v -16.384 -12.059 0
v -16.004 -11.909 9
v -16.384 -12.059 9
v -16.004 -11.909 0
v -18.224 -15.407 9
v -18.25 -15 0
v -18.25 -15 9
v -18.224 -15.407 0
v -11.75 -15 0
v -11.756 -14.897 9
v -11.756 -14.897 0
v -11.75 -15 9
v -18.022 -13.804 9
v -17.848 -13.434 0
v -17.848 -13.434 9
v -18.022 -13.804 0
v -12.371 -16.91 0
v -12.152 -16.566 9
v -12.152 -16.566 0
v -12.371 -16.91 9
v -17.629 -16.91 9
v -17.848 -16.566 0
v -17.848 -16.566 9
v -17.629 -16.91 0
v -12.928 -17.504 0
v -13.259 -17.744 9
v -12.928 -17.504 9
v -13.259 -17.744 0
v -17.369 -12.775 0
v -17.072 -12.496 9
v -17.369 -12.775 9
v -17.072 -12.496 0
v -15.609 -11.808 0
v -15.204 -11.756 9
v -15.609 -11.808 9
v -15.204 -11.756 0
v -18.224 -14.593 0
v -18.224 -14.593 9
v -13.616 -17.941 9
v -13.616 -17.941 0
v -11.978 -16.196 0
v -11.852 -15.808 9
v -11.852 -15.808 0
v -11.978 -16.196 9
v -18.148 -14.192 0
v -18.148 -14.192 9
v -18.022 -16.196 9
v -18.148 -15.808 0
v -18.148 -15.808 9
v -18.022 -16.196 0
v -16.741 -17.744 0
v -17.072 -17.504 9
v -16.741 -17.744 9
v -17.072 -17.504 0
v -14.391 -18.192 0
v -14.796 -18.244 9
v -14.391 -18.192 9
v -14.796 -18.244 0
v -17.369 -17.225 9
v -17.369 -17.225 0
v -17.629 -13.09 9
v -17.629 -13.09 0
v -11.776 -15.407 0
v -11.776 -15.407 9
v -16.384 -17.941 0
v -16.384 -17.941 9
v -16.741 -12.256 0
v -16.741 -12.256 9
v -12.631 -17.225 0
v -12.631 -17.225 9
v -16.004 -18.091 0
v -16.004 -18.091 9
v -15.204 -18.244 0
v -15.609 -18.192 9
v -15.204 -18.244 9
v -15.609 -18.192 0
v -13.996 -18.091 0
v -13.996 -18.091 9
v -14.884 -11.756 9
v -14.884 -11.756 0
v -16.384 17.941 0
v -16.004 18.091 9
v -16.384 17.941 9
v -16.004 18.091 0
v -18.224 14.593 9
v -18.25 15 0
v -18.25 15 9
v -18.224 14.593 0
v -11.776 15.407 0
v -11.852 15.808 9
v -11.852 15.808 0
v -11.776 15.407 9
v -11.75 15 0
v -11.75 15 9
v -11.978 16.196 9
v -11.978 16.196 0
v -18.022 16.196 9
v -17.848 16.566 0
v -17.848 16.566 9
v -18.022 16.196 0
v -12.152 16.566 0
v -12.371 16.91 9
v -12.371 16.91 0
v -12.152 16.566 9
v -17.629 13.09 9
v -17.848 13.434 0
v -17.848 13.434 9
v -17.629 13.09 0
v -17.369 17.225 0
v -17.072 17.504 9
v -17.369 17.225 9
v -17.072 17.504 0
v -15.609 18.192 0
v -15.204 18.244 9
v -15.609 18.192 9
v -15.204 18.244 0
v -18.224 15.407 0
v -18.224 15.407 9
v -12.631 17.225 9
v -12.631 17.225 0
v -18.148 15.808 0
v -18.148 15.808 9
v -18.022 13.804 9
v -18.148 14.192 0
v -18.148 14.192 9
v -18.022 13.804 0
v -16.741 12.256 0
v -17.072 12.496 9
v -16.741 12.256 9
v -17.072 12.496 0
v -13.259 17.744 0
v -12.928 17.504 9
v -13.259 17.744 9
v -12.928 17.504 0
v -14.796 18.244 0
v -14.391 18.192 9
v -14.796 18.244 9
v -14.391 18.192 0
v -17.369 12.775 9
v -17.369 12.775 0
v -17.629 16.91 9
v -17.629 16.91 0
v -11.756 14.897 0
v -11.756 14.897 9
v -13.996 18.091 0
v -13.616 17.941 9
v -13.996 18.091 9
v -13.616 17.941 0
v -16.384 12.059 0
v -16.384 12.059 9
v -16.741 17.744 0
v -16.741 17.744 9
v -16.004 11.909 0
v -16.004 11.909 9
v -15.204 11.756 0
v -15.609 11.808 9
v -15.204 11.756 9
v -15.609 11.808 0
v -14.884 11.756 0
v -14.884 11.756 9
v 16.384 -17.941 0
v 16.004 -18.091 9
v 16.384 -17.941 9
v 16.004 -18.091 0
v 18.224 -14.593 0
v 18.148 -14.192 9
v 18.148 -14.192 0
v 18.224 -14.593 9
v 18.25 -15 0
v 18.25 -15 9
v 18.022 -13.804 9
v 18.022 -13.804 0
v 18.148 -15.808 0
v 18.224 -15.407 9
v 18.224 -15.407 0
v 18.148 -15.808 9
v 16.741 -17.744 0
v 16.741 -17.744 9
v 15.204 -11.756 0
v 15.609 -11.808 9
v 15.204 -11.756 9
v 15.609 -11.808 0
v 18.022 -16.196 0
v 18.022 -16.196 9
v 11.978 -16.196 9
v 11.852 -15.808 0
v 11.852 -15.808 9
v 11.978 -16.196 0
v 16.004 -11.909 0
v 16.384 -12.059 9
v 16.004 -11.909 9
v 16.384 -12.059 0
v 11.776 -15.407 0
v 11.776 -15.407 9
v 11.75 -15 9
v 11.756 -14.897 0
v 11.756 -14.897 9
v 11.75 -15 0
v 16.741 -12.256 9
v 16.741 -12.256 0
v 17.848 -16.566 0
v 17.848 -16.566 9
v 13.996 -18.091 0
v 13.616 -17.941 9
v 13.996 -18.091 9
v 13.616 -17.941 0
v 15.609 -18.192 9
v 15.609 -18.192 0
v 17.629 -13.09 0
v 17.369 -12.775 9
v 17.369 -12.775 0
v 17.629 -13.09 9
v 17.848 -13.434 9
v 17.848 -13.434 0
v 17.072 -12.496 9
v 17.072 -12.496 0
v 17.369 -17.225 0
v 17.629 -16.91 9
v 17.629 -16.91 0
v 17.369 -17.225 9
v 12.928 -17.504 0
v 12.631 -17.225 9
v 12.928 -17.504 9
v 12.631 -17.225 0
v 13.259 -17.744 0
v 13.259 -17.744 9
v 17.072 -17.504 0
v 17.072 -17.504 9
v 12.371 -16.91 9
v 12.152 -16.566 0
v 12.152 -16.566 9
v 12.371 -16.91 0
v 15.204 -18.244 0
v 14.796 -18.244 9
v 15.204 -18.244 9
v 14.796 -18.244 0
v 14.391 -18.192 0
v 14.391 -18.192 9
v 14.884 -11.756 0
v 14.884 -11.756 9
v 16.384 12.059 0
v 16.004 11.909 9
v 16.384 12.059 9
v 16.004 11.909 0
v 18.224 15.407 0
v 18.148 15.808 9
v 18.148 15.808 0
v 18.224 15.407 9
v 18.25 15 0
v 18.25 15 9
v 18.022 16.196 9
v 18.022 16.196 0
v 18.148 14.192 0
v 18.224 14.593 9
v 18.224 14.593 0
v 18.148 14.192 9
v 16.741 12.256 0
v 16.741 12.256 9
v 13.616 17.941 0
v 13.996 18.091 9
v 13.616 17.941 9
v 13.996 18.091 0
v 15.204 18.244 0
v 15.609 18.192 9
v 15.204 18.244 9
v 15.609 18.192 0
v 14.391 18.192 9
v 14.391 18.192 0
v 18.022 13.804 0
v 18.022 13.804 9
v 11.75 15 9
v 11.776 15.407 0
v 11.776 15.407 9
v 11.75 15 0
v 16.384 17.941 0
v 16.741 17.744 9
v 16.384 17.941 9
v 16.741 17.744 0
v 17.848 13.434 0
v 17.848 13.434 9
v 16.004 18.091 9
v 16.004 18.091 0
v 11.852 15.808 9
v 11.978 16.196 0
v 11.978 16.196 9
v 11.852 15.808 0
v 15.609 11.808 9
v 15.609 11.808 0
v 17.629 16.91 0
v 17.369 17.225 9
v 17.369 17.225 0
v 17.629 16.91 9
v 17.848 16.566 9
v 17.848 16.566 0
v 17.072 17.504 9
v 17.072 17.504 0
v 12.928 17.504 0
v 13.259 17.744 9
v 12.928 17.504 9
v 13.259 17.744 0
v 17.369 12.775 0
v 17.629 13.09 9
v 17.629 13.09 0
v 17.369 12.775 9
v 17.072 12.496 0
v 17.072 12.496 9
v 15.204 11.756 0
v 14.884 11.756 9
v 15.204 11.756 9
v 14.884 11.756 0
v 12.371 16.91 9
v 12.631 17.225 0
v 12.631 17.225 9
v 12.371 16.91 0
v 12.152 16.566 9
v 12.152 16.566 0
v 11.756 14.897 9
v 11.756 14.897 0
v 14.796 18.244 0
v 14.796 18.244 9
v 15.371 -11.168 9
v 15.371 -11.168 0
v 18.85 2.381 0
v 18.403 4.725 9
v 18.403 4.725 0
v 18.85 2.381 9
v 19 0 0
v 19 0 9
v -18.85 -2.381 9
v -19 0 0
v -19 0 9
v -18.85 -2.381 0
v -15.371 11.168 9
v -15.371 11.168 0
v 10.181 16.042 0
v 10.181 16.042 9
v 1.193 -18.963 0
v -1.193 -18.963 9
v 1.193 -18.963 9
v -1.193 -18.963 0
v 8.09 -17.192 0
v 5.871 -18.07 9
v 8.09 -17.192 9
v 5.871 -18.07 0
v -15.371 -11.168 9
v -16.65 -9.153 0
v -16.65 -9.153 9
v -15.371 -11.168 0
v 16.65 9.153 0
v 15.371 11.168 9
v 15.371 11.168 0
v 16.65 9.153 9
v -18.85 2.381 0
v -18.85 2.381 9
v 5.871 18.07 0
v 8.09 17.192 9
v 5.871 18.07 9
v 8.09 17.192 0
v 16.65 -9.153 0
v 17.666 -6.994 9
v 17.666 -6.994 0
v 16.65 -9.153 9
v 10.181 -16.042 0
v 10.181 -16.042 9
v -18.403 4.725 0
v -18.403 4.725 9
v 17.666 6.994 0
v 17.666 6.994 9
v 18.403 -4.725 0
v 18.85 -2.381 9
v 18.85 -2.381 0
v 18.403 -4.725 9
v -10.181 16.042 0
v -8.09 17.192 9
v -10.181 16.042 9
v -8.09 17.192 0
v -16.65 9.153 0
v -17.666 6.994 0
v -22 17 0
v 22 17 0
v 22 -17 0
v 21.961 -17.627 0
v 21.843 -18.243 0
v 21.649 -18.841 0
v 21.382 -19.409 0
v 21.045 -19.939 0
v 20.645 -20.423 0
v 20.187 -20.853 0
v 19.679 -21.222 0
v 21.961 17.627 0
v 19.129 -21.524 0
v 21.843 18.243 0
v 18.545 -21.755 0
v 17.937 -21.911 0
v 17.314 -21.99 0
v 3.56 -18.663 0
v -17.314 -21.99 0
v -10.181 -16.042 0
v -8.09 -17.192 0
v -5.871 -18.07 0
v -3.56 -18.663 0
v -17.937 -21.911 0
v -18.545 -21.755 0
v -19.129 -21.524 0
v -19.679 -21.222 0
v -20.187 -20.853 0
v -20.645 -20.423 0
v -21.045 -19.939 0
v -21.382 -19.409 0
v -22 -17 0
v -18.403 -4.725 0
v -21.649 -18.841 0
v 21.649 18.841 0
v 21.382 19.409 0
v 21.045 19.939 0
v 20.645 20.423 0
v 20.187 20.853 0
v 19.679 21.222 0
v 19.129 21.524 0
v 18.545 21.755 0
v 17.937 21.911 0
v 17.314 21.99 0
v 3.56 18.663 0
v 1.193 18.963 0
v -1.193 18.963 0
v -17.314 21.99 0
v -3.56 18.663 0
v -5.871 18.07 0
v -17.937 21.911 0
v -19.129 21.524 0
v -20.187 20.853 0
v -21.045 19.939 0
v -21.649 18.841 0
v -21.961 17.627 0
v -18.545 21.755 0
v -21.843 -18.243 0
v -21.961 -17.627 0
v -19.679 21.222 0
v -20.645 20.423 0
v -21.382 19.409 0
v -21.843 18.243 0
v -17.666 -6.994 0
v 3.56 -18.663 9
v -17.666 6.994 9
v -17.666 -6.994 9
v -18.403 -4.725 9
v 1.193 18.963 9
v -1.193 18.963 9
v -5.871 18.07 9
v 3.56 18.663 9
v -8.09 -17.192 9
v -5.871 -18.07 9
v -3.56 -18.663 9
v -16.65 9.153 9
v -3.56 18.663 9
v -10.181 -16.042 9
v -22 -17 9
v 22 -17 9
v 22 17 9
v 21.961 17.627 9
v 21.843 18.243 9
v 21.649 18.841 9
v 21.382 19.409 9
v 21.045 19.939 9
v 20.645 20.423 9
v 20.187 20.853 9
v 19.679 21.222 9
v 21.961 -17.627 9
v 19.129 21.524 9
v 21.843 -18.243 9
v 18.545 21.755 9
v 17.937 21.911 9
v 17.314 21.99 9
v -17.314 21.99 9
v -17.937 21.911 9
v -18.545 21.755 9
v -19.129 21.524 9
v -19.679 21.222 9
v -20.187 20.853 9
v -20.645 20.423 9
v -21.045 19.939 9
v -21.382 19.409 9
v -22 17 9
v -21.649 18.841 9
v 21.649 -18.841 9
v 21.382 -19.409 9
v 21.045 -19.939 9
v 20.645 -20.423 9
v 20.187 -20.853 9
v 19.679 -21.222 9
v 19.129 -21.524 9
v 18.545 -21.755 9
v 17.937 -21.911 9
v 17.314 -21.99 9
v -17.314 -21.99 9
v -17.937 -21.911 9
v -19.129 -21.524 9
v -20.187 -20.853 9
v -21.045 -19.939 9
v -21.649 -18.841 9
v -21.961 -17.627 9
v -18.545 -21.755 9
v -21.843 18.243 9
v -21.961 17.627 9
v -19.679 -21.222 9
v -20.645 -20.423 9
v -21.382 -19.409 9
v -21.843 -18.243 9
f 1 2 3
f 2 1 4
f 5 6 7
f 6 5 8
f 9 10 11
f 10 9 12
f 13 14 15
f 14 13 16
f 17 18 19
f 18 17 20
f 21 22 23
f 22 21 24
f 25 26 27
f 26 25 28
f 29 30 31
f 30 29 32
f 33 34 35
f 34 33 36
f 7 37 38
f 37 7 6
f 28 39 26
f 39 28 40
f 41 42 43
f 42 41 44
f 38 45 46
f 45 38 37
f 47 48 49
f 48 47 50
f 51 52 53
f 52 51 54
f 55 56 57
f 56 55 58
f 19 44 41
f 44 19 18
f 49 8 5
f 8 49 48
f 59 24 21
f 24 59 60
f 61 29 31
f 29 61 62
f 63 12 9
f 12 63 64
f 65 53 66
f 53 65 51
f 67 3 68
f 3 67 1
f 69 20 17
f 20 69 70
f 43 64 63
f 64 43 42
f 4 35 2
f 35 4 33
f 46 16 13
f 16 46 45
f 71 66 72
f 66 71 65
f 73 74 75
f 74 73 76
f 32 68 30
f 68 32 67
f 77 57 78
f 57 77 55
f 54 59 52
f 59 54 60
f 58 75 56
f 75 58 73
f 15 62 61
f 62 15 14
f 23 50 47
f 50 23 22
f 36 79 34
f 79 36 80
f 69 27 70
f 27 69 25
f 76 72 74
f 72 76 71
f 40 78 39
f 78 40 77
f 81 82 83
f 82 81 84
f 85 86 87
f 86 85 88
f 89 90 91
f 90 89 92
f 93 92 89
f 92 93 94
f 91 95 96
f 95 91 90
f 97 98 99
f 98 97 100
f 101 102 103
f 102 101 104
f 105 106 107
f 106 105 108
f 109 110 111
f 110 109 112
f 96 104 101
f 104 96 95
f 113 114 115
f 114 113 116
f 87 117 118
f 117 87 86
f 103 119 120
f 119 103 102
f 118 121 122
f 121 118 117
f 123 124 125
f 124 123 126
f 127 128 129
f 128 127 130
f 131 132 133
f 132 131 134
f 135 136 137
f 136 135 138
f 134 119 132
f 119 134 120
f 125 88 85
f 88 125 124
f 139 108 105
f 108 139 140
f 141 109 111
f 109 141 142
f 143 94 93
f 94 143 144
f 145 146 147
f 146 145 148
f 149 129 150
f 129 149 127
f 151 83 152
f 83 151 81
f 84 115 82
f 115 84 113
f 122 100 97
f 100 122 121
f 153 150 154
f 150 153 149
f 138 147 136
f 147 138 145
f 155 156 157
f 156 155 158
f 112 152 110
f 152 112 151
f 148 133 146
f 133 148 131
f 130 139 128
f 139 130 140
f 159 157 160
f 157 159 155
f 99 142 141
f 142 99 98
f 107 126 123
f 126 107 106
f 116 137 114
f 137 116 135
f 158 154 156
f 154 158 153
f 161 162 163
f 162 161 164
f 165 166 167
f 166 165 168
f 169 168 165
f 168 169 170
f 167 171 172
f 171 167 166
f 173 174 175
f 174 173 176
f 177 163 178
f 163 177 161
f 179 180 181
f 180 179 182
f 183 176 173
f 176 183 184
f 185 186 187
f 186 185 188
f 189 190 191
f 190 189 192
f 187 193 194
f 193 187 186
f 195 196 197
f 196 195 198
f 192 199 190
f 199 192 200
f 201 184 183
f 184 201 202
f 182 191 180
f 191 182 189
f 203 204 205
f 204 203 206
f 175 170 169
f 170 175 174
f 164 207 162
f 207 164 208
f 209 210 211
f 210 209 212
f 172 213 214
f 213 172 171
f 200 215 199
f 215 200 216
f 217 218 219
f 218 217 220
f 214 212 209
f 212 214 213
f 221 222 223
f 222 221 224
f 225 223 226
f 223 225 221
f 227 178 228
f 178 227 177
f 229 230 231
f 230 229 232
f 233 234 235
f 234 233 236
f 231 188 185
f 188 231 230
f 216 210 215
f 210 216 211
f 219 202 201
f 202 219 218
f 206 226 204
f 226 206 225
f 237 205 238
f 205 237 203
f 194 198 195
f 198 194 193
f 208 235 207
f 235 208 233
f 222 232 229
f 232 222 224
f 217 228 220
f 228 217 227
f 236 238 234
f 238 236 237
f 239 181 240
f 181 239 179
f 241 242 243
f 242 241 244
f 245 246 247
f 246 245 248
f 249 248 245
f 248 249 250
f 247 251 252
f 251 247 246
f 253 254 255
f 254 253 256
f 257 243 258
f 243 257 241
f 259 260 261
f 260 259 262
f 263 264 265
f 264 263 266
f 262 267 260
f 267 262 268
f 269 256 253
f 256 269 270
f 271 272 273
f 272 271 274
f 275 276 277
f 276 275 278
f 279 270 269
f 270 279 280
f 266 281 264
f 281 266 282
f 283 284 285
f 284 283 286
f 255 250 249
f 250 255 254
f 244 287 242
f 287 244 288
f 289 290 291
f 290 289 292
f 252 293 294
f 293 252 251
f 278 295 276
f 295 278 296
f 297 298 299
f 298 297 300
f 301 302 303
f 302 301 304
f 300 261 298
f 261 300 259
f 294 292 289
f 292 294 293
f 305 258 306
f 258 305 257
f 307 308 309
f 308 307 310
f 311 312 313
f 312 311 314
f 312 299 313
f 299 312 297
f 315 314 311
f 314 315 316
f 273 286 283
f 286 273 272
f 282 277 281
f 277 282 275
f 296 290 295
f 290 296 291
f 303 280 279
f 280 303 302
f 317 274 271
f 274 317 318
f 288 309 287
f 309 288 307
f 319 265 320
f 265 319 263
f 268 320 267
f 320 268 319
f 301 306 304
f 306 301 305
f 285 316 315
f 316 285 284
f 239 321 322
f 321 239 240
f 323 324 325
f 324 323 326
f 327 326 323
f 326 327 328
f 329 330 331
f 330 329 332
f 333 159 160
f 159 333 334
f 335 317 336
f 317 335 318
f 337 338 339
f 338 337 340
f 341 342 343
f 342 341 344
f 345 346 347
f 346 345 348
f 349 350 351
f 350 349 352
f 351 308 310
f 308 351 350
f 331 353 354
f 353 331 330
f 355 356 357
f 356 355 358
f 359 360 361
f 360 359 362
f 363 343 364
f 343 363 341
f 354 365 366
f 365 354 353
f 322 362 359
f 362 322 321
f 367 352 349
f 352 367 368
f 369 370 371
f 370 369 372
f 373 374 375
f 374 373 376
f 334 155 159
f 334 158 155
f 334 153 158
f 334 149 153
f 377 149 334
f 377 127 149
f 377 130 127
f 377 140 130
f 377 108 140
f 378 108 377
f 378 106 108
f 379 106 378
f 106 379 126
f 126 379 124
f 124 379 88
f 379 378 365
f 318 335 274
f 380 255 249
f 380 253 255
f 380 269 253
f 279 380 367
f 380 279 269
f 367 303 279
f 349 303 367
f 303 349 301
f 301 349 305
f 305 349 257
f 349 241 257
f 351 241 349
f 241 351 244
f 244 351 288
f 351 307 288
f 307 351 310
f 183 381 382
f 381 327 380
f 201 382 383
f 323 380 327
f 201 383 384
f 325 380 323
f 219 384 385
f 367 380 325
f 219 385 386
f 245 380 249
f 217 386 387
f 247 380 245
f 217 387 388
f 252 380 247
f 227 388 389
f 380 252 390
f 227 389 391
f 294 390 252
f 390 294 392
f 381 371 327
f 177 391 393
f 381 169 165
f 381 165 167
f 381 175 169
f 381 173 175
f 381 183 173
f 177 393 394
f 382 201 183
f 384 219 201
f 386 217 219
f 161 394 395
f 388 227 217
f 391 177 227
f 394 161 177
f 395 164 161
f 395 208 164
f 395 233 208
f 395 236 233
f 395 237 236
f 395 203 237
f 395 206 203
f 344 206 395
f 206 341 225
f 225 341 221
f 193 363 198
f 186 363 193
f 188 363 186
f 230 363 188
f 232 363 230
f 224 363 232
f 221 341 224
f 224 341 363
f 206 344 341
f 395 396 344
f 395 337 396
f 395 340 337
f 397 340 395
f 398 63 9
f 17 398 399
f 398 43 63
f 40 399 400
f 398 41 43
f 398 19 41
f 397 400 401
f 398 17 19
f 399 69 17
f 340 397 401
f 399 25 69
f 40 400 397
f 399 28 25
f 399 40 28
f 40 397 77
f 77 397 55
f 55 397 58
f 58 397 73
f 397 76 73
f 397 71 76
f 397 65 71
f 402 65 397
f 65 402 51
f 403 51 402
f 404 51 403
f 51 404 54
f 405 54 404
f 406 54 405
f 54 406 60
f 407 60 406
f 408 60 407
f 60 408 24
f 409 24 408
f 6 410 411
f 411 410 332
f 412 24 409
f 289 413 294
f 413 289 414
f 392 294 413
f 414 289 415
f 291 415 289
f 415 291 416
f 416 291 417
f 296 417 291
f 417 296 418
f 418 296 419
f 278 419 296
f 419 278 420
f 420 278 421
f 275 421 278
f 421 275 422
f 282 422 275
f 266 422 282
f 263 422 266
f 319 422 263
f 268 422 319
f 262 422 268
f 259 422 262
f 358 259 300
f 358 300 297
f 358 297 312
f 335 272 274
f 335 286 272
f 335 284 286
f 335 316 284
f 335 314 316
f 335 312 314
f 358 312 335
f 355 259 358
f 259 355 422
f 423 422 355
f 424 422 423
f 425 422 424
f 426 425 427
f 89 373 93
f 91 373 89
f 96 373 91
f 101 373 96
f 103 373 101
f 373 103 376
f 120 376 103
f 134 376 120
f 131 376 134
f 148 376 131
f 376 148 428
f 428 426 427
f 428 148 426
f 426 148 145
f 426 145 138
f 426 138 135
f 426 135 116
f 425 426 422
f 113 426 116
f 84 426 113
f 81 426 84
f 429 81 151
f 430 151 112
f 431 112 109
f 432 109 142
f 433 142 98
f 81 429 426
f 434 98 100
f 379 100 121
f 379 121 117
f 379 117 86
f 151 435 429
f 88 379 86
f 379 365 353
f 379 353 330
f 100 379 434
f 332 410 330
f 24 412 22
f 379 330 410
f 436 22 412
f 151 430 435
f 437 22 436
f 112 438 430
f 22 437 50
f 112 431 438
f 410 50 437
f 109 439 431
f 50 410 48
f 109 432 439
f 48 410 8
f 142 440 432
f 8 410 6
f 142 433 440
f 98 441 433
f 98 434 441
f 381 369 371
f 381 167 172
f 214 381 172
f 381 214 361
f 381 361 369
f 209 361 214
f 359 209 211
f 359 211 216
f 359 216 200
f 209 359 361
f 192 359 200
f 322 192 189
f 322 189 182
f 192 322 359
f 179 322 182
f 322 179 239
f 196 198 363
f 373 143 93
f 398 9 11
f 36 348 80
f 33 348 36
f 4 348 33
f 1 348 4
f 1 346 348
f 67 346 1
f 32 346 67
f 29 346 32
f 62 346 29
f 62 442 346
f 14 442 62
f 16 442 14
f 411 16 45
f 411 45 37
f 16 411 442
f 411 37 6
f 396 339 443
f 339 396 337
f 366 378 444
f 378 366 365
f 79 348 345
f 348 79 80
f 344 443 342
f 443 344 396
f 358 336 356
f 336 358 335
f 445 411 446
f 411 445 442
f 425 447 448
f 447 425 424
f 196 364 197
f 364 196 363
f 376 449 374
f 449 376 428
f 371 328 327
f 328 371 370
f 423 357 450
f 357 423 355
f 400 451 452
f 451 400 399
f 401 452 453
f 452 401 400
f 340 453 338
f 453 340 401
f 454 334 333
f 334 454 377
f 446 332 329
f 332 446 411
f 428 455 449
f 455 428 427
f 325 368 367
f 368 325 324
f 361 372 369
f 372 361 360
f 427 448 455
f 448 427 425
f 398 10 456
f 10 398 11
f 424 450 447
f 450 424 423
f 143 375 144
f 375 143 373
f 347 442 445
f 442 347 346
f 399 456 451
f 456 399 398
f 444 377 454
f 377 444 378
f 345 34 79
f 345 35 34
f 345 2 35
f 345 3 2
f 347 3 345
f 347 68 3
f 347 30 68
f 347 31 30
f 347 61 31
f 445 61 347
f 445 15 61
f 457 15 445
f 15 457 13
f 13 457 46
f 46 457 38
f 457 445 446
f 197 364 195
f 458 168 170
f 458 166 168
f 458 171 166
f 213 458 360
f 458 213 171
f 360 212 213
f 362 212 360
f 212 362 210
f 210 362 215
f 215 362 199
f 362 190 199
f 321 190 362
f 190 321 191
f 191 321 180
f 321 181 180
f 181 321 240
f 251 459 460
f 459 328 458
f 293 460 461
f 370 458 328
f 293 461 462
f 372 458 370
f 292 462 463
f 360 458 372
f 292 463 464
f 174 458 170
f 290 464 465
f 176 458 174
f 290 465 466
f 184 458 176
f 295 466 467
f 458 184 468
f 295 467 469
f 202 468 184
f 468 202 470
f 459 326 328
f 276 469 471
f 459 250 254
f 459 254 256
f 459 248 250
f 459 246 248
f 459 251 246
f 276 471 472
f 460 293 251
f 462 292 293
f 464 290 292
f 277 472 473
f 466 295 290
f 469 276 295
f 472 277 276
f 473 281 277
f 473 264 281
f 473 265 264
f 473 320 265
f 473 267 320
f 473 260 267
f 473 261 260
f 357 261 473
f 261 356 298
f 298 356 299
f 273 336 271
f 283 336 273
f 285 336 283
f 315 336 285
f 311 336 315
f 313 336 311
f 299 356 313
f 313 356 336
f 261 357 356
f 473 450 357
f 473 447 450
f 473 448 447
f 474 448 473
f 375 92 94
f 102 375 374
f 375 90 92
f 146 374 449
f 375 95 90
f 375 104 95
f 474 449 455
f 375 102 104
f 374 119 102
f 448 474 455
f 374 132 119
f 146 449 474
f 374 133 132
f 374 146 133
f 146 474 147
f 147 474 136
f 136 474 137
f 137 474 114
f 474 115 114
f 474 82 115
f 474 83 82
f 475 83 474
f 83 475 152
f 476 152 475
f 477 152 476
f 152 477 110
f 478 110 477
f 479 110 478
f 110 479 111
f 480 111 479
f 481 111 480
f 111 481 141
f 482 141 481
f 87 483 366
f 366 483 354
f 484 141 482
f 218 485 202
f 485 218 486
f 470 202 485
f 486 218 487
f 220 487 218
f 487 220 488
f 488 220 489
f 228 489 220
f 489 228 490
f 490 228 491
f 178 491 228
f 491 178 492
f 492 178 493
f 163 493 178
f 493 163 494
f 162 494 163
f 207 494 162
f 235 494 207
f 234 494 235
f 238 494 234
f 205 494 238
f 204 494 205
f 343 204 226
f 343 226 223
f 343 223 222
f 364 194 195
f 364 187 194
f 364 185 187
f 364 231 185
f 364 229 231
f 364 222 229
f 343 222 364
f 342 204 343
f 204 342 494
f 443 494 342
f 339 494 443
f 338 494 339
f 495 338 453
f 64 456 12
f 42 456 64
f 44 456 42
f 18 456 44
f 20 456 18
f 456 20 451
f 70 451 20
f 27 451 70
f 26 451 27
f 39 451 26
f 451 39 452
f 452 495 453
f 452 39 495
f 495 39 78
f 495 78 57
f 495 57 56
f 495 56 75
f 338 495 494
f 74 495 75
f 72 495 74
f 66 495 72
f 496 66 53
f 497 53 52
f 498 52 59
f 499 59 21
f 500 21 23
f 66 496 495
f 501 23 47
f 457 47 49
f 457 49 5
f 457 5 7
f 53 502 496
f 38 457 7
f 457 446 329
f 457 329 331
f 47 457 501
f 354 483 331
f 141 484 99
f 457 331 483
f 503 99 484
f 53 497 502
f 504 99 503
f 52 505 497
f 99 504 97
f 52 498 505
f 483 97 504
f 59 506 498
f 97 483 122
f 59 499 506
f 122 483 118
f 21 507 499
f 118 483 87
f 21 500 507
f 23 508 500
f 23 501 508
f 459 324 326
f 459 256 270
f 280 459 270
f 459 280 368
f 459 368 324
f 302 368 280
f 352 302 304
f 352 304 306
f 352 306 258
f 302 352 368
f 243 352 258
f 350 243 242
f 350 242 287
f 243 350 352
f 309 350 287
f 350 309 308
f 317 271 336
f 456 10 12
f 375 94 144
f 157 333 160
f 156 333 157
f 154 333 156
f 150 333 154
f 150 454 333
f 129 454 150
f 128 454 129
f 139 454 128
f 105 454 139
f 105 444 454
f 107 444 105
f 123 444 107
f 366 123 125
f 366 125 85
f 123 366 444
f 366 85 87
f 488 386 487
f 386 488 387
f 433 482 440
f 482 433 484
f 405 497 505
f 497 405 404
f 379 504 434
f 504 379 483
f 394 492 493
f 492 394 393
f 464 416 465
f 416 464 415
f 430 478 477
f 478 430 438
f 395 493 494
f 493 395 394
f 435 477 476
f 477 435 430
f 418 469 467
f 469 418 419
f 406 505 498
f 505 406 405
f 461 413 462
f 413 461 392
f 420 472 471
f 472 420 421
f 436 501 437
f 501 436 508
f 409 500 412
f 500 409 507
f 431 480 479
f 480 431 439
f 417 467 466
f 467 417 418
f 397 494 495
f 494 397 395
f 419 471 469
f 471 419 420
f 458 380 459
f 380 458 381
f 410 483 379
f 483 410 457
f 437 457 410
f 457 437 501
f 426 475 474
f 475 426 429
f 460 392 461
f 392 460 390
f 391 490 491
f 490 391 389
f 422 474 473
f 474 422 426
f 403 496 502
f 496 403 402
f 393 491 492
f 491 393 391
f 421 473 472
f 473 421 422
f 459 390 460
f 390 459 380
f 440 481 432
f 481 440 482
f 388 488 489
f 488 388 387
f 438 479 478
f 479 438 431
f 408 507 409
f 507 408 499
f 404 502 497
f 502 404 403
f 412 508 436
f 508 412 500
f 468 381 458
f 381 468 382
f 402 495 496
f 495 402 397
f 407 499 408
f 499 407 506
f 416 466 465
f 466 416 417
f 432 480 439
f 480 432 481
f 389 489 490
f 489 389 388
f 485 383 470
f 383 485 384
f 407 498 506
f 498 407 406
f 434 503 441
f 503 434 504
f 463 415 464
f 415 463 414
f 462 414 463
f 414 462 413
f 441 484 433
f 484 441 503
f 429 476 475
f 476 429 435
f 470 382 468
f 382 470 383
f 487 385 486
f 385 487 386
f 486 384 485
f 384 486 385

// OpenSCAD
$fn = 50;

difference() {
	union() {
		hull() {
			translate(v = [-17.0, 17.0, 0]) {
				cylinder(h = 9, r = 5);
			}
			translate(v = [17.0, 17.0, 0]) {
				cylinder(h = 9, r = 5);
			}
			translate(v = [-17.0, -17.0, 0]) {
				cylinder(h = 9, r = 5);
			}
			translate(v = [17.0, -17.0, 0]) {
				cylinder(h = 9, r = 5);
			}
		}
	}
	union() {
		translate(v = [-15.0, -15.0, -100.0]) {
			cylinder(h = 200, r = 3.25);
		}
		translate(v = [-15.0, 15.0, -100.0]) {
			cylinder(h = 200, r = 3.25);
		}
		translate(v = [15.0, -15.0, -100.0]) {
			cylinder(h = 200, r = 3.25);
		}
		translate(v = [15.0, 15.0, -100.0]) {
			cylinder(h = 200, r = 3.25);
		}
		translate(v = [-15.0, -15.0, -100.0]) {
			cylinder(h = 200, r = 1.8);
		}
		translate(v = [-15.0, 15.0, -100.0]) {
			cylinder(h = 200, r = 1.8);
		}
		translate(v = [15.0, -15.0, -100.0]) {
			cylinder(h = 200, r = 1.8);
		}
		translate(v = [15.0, 15.0, -100.0]) {
			cylinder(h = 200, r = 1.8);
		}
		cylinder(h = 9, r = 19.0);
	}
}
